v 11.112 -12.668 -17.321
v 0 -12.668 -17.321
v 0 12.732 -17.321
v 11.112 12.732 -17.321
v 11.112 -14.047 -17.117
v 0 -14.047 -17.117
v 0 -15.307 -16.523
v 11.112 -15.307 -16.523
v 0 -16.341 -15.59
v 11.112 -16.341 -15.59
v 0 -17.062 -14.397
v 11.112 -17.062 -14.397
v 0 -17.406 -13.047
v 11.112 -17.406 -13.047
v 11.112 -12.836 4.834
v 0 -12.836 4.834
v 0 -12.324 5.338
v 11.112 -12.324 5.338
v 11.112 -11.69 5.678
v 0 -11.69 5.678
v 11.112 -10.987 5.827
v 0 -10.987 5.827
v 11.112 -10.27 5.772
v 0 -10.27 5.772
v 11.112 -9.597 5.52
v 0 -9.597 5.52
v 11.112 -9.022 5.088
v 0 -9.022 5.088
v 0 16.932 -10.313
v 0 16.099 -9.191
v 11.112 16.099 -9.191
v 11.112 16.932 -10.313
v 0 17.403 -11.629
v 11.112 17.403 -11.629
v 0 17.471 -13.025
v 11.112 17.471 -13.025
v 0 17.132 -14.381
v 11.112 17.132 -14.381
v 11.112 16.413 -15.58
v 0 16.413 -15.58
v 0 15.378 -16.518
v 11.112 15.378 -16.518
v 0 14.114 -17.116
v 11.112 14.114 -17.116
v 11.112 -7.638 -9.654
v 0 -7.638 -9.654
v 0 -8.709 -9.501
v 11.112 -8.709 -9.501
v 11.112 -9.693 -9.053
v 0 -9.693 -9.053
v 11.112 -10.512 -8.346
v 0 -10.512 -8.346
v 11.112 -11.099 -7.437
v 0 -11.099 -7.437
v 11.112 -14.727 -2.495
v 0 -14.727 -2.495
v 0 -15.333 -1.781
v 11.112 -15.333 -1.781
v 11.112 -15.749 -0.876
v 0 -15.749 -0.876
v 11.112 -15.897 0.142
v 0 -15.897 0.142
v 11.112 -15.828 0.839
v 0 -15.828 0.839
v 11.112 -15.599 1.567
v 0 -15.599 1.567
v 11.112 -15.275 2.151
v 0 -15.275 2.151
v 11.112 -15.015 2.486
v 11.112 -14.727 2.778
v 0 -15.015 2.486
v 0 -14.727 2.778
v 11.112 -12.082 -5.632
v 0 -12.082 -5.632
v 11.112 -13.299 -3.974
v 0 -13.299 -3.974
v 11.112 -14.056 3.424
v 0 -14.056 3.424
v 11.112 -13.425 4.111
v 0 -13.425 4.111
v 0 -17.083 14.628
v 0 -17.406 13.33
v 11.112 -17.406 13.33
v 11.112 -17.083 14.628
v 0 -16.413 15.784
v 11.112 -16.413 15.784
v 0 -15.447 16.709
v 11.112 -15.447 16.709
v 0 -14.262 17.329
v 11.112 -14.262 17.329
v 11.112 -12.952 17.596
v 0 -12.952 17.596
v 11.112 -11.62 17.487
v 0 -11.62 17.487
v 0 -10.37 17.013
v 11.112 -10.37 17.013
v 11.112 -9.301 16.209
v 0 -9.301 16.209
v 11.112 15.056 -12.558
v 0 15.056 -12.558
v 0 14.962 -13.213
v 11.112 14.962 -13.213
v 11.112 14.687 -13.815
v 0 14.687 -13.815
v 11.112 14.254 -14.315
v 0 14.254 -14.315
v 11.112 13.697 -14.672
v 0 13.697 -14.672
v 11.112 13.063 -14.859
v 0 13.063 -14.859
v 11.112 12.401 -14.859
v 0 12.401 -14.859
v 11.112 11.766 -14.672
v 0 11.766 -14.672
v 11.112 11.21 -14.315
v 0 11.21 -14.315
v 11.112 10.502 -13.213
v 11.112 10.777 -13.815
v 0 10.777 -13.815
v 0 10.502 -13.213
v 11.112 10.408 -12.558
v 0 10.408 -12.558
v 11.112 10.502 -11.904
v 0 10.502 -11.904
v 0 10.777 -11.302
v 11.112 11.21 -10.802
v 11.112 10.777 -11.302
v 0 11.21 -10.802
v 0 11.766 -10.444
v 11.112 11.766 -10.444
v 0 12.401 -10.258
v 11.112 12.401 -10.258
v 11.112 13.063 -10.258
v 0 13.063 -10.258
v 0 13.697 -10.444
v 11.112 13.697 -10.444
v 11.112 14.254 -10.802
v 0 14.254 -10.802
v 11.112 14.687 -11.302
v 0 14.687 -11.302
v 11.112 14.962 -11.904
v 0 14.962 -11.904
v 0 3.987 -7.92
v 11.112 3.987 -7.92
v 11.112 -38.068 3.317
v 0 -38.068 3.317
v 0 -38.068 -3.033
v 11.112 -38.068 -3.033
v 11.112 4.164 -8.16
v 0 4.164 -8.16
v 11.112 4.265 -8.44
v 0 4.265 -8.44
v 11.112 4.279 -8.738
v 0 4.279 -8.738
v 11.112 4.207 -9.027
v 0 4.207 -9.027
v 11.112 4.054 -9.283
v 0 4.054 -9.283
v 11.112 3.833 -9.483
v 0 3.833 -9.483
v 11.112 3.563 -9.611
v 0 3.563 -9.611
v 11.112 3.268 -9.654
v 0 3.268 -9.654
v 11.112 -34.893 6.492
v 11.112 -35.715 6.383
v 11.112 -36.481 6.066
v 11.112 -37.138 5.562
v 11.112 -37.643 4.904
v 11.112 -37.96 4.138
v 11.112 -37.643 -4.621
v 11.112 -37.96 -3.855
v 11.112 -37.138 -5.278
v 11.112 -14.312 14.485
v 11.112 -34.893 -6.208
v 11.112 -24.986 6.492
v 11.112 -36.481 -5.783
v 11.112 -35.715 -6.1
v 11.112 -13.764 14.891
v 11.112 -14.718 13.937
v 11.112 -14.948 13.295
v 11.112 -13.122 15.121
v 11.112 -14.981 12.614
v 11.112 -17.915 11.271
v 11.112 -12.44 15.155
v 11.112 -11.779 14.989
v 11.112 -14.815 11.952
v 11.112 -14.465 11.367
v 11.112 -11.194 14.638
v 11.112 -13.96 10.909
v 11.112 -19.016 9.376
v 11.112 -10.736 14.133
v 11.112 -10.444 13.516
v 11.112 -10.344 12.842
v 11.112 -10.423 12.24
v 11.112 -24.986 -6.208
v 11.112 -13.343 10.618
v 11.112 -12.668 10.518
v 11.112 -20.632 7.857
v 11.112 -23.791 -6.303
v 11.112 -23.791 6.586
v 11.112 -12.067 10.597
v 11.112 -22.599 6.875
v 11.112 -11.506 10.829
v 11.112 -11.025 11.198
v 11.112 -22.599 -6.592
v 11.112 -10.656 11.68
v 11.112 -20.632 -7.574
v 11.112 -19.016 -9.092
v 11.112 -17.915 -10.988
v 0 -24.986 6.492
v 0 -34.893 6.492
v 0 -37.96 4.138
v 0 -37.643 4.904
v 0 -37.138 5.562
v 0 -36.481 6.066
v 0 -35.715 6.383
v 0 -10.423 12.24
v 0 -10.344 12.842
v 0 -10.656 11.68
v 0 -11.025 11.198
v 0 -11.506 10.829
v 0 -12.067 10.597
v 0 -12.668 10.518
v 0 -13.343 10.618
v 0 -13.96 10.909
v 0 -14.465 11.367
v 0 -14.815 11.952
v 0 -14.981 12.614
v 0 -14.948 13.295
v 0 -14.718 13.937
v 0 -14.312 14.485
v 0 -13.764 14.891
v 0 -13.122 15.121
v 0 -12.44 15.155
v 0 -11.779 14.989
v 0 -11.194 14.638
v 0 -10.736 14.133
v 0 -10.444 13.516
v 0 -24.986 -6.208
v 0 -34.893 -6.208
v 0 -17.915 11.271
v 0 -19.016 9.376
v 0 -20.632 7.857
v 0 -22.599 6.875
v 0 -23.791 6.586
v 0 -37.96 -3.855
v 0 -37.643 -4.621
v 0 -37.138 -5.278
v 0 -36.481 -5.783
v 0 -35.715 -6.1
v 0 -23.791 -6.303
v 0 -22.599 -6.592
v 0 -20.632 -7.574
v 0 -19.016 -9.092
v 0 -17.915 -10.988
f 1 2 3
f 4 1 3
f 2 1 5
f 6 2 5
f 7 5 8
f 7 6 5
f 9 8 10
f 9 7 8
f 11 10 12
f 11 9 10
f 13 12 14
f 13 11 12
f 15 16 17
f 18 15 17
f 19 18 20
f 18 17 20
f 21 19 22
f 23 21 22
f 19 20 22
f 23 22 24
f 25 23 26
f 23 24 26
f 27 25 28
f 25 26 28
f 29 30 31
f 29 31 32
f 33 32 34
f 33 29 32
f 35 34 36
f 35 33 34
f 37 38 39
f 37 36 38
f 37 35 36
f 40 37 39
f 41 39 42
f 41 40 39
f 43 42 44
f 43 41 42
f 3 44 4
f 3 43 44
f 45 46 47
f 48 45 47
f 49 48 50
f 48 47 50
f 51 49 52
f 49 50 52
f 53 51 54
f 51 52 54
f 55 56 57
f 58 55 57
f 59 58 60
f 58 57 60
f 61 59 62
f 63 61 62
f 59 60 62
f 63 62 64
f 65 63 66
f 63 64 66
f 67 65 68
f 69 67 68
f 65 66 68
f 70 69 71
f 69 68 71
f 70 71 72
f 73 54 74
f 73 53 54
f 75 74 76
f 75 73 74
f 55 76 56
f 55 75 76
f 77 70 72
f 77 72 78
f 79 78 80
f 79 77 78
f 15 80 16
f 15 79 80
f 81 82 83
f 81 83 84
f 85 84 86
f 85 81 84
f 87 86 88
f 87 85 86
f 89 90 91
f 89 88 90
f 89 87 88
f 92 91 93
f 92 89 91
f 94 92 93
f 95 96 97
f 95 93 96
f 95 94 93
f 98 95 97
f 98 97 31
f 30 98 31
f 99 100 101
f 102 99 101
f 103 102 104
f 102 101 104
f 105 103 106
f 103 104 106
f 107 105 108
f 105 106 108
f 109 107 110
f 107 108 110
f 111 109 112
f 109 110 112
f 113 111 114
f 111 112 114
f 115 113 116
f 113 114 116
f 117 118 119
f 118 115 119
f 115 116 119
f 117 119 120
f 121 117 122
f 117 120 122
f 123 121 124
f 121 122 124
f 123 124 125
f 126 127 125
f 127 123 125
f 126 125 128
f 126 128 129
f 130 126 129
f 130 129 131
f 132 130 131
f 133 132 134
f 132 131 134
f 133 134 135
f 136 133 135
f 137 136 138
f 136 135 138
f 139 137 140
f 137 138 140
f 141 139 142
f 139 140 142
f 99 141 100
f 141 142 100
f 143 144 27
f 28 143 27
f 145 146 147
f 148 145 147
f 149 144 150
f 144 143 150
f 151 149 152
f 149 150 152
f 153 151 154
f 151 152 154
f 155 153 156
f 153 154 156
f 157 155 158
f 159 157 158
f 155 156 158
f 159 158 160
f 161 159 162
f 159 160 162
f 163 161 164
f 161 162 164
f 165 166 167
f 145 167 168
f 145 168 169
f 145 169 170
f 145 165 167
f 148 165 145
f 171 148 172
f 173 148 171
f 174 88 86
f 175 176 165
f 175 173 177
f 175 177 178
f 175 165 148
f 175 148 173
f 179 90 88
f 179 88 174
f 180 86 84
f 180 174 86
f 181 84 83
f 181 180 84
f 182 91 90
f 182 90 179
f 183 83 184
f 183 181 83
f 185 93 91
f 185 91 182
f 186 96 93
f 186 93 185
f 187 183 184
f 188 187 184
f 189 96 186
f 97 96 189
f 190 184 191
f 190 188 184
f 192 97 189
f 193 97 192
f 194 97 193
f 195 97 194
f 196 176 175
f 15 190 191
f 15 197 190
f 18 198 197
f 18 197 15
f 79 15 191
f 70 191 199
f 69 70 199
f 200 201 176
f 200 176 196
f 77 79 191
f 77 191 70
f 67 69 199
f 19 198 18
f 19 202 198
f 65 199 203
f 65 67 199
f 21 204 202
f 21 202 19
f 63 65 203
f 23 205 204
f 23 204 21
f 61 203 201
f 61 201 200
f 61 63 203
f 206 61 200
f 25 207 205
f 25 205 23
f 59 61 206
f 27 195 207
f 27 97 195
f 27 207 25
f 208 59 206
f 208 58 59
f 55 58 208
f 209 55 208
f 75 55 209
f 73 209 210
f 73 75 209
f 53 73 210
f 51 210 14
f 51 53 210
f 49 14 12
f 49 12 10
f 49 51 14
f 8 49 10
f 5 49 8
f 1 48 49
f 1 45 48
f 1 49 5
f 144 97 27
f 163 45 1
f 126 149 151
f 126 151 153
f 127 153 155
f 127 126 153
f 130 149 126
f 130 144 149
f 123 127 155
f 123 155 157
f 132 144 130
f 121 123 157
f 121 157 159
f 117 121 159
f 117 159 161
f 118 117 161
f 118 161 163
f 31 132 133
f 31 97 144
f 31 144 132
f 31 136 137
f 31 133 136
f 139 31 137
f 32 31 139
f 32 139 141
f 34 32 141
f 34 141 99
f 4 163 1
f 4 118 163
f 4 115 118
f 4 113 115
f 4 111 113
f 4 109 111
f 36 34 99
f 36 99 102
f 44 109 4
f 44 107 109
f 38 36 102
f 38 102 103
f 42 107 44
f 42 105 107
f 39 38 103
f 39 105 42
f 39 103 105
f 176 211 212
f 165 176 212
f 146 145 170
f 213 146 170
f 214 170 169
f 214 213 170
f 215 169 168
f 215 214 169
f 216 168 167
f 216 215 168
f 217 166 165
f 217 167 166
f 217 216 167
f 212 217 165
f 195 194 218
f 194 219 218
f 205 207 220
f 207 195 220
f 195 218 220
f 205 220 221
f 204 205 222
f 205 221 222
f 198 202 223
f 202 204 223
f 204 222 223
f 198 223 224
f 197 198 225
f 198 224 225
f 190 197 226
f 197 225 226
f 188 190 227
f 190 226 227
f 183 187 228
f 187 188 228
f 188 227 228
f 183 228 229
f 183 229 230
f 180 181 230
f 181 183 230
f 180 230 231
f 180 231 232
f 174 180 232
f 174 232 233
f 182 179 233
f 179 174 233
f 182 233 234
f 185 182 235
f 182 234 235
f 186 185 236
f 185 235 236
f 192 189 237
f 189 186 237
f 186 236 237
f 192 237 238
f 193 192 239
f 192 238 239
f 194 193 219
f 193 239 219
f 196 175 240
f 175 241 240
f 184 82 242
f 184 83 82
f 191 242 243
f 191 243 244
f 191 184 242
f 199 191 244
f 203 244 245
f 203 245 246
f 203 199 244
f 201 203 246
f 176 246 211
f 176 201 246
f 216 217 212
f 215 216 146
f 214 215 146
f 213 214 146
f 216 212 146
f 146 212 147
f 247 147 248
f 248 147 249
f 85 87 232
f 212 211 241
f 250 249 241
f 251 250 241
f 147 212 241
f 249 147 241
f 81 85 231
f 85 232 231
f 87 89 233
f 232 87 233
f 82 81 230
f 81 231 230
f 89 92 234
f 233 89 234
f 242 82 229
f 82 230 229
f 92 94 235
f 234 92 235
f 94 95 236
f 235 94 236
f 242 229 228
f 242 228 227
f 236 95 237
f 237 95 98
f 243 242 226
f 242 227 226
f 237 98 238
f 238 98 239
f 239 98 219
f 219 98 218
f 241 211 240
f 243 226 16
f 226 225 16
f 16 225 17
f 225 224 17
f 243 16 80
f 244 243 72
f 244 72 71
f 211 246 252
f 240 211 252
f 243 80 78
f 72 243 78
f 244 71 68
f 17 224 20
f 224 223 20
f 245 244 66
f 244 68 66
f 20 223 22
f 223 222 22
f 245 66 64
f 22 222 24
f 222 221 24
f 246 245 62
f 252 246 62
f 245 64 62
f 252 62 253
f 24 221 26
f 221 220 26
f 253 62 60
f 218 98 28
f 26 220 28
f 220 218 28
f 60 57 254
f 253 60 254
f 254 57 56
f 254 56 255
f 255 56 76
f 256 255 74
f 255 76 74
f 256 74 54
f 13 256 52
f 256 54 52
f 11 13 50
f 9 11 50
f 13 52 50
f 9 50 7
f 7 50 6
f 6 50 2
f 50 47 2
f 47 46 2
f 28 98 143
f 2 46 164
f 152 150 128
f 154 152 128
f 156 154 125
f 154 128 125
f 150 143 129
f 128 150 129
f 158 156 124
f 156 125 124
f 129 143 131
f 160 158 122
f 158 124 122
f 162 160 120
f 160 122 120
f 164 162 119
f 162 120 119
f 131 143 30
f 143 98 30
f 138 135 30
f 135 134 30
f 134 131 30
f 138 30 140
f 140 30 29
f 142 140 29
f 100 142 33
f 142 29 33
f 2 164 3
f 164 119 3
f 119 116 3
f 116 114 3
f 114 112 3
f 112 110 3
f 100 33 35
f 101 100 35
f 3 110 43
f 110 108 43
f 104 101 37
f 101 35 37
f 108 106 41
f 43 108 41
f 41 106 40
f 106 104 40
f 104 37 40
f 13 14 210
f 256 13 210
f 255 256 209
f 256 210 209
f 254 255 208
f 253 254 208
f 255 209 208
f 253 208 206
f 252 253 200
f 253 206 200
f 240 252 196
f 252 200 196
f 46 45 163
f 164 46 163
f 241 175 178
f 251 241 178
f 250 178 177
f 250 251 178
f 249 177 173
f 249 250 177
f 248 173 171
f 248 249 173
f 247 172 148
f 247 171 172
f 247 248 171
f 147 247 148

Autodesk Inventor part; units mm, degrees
ref_plane "YZ Plane" through (0, 0, 0) normal (1, 0, 0) x (0, 1, 0)
ref_plane "XZ Plane" through (0, 0, 0) normal (0, 1, 0) x (-1, 0, 0)
ref_plane "XY Plane" through (0, 0, 0) normal (0, 0, 1) x (1, 0, 0)
sketch "Sketch1" plane through (0, 0, 0) normal (1, 0, 0) x (0, 1, 0)
  line L0 (-12.6683, 12.8416) -> (-12.6683, 0.1416)
  line L1 (-12.6683, 0.1416) -> (-12.6683, -12.5584)
  line L2 (-12.6683, -12.5584) -> (0.0318, -12.5584)
  line L3 (0.0318, -12.5584) -> (12.7318, -12.5584)
  circle A0 centre (-12.6683, 12.8416) radius 2.3241
  circle A1 centre (12.7318, -12.5584) radius 2.3241
  line L4 (-12.6683, 12.8416) -> (-12.6683, -12.5584) construction
  line L5 (-17.4308, 12.8416) -> (-17.4308, -12.5584)
  line L6 (-7.9058, -12.5584) -> (-7.9058, 12.8416)
  arc A2 (-7.9058, 12.8416) -> (-17.4308, 12.8416) centre (-12.6683, 12.8416) ccw
  arc A3 (-17.4308, -12.5584) -> (-7.9058, -12.5584) centre (-12.6683, -12.5584) ccw
  line L7 (12.7318, -12.5584) -> (-12.6683, -12.5584) construction
  line L8 (12.7318, -7.7959) -> (-12.6683, -7.7959)
  line L9 (-12.6683, -17.3209) -> (12.7318, -17.3209)
  arc A4 (12.7318, -17.3209) -> (12.7318, -7.7959) centre (12.7318, -12.5584) ccw
  arc A5 (-12.6683, -7.7959) -> (-12.6683, -17.3209) centre (-12.6683, -12.5584) ccw
  line L10 (-12.6683, 0.1416) -> (-38.0683, 0.1416)
  arc A6 (-7.9058, 4.3417) -> (-7.9058, -4.0585) centre (-12.6683, 0.1416) ccw
  line L11 (-12.6683, 6.4916) -> (-34.8933, 6.4916)
  line L12 (-38.0683, 3.3166) -> (-38.0683, -3.0334)
  line L13 (-34.8933, -6.2084) -> (-12.6683, -6.2084)
  arc A7 (-34.8933, 6.4916) -> (-38.0683, 3.3166) centre (-34.8933, 3.3166) ccw
  arc A8 (-38.0683, -3.0334) -> (-34.8933, -6.2084) centre (-34.8933, -3.0334) ccw
  point P0 (0, 0)
  point P1 (0.0317, -12.5584)
  point P2 (-7.9058, -7.7959)
  point P3 (-17.4308, -6.2084)
  point P4 (-17.4308, 6.4916)
  dimension "d1" = 4.6482
  dimension "d2" = 4.6482
  dimension "d3" = 9.525
  dimension "d7" = 25.4
  dimension "d8" = 12.7
  dimension "d9" = 3.175
extrude "Extrusion1" add sketch "Sketch1" along normal blind 11.1125
fillet "Fillet1" radius 7.62 1 edges at (5.5563, -17.4308, -6.2084)
sketch "Sketch3" plane through (11.1125, 0, 0) normal (1, 0, 0) x (0, 0, -1)
  arc A0 (-12.8416, -7.9058) -> (-12.8416, -17.4308) centre (-12.8416, -12.6683) ccw projected
  line L0 (-12.8416, -17.4308) -> (-6.4916, -17.4308) projected
  line L1 (-6.4916, -17.4308) -> (-6.4916, -34.8933) projected
  arc A1 (-6.4916, -34.8933) -> (-3.3166, -38.0683) centre (-3.3166, -34.8933) ccw projected
  line L2 (-3.3166, -38.0683) -> (3.0334, -38.0683) projected
  arc A2 (3.0334, -38.0683) -> (6.2084, -34.8933) centre (3.0334, -34.8933) ccw projected
  line L3 (6.2084, -34.8933) -> (6.2084, -24.9854) projected
  arc A3 (13.0468, -17.4056) -> (6.2084, -24.9854) centre (13.8284, -24.9854) ccw projected
  arc A4 (13.0468, -17.4056) -> (17.3209, -12.6683) centre (12.5584, -12.6683) ccw projected
  line L4 (17.3209, -12.6683) -> (17.3209, 12.7318) projected
  arc A5 (17.3209, 12.7318) -> (7.7959, 12.7318) centre (12.5584, 12.7318) ccw projected
  line L5 (7.7959, 12.7318) -> (7.7959, -7.9058) projected
  line L6 (7.7959, -7.9058) -> (-12.8416, -7.9058) projected
  circle A6 centre (-12.8416, -12.6683) radius 2.3241 projected
  circle A7 centre (12.5584, 12.7318) radius 2.3241 projected
  line L7 (-16.2092, -9.3007) -> (9.1908, 16.0993)
  arc A8 (-12.8416, -7.9058) -> (-12.8416, -17.4308) centre (-12.8416, -12.6683) ccw projected
  point P0 (0, 0)
extrude "Extrusion2" add sketch "Sketch3" against normal up to surface (11.1125 mm away) contours A0 L7 A5 L5 L6
fillet "Fillet2" radius 7.62 1 edges at (5.5563, -17.4308, 6.4916)
sketch "Sketch4" plane through (11.1125, 0, 0) normal (1, 0, 0) x (0, 0, -1)
  arc A0 (-16.2092, -9.3007) -> (-13.3301, -17.4056) centre (-12.8416, -12.6683) ccw projected
  arc A1 (-6.4916, -24.9854) -> (-13.3301, -17.4056) centre (-14.1116, -24.9854) ccw projected
  line L0 (-6.4916, -24.9854) -> (-6.4916, -34.8933) projected
  arc A2 (-6.4916, -34.8933) -> (-3.3166, -38.0683) centre (-3.3166, -34.8933) ccw projected
  line L1 (-3.3166, -38.0683) -> (3.0334, -38.0683) projected
  arc A3 (3.0334, -38.0683) -> (6.2084, -34.8933) centre (3.0334, -34.8933) ccw projected
  line L2 (6.2084, -34.8933) -> (6.2084, -24.9854) projected
  arc A4 (13.0468, -17.4056) -> (6.2084, -24.9854) centre (13.8284, -24.9854) ccw projected
  arc A5 (13.0468, -17.4056) -> (17.3209, -12.6683) centre (12.5584, -12.6683) ccw projected
  line L3 (17.3209, -12.6683) -> (17.3209, 12.7318) projected
  arc A6 (17.3209, 12.7318) -> (9.1908, 16.0993) centre (12.5584, 12.7318) ccw projected
  line L4 (9.1908, 16.0993) -> (-16.2092, -9.3007) projected
  circle A7 centre (-12.8416, -12.6683) radius 2.3241 projected
  circle A8 centre (12.5584, 12.7318) radius 2.3241 projected
  arc A9 (-0.1416, -18.7795) -> (-7.3449, -11.2783) centre (-14.1116, -24.9854) ccw
  arc A10 (9.6545, -10.2799) -> (-0.1416, -18.7795) centre (13.8284, -24.9854) ccw
  line L5 (9.6545, -10.2799) -> (9.6545, 5.7211)
  line L6 (9.6545, 5.7211) -> (-7.3449, -11.2783)
  point P0 (0, 0)
extrude "Extrusion3" cut sketch "Sketch4" against normal blind 25.4 contours A9 L6 L5 A10
fillet "Fillet3" radius 3.81 1 edges at (5.5563, -10.2799, -9.6545)
fillet "Fillet4" radius 3.556 1 edges at (5.5563, -18.7795, 0.1416)
fillet "Fillet5" radius 2.54 1 edges at (5.5563, -11.2783, 7.3449)
fillet "Fillet6" radius 1.016 1 edges at (5.5563, 5.7211, -9.6545)
properties part number "MOGO Mech"
